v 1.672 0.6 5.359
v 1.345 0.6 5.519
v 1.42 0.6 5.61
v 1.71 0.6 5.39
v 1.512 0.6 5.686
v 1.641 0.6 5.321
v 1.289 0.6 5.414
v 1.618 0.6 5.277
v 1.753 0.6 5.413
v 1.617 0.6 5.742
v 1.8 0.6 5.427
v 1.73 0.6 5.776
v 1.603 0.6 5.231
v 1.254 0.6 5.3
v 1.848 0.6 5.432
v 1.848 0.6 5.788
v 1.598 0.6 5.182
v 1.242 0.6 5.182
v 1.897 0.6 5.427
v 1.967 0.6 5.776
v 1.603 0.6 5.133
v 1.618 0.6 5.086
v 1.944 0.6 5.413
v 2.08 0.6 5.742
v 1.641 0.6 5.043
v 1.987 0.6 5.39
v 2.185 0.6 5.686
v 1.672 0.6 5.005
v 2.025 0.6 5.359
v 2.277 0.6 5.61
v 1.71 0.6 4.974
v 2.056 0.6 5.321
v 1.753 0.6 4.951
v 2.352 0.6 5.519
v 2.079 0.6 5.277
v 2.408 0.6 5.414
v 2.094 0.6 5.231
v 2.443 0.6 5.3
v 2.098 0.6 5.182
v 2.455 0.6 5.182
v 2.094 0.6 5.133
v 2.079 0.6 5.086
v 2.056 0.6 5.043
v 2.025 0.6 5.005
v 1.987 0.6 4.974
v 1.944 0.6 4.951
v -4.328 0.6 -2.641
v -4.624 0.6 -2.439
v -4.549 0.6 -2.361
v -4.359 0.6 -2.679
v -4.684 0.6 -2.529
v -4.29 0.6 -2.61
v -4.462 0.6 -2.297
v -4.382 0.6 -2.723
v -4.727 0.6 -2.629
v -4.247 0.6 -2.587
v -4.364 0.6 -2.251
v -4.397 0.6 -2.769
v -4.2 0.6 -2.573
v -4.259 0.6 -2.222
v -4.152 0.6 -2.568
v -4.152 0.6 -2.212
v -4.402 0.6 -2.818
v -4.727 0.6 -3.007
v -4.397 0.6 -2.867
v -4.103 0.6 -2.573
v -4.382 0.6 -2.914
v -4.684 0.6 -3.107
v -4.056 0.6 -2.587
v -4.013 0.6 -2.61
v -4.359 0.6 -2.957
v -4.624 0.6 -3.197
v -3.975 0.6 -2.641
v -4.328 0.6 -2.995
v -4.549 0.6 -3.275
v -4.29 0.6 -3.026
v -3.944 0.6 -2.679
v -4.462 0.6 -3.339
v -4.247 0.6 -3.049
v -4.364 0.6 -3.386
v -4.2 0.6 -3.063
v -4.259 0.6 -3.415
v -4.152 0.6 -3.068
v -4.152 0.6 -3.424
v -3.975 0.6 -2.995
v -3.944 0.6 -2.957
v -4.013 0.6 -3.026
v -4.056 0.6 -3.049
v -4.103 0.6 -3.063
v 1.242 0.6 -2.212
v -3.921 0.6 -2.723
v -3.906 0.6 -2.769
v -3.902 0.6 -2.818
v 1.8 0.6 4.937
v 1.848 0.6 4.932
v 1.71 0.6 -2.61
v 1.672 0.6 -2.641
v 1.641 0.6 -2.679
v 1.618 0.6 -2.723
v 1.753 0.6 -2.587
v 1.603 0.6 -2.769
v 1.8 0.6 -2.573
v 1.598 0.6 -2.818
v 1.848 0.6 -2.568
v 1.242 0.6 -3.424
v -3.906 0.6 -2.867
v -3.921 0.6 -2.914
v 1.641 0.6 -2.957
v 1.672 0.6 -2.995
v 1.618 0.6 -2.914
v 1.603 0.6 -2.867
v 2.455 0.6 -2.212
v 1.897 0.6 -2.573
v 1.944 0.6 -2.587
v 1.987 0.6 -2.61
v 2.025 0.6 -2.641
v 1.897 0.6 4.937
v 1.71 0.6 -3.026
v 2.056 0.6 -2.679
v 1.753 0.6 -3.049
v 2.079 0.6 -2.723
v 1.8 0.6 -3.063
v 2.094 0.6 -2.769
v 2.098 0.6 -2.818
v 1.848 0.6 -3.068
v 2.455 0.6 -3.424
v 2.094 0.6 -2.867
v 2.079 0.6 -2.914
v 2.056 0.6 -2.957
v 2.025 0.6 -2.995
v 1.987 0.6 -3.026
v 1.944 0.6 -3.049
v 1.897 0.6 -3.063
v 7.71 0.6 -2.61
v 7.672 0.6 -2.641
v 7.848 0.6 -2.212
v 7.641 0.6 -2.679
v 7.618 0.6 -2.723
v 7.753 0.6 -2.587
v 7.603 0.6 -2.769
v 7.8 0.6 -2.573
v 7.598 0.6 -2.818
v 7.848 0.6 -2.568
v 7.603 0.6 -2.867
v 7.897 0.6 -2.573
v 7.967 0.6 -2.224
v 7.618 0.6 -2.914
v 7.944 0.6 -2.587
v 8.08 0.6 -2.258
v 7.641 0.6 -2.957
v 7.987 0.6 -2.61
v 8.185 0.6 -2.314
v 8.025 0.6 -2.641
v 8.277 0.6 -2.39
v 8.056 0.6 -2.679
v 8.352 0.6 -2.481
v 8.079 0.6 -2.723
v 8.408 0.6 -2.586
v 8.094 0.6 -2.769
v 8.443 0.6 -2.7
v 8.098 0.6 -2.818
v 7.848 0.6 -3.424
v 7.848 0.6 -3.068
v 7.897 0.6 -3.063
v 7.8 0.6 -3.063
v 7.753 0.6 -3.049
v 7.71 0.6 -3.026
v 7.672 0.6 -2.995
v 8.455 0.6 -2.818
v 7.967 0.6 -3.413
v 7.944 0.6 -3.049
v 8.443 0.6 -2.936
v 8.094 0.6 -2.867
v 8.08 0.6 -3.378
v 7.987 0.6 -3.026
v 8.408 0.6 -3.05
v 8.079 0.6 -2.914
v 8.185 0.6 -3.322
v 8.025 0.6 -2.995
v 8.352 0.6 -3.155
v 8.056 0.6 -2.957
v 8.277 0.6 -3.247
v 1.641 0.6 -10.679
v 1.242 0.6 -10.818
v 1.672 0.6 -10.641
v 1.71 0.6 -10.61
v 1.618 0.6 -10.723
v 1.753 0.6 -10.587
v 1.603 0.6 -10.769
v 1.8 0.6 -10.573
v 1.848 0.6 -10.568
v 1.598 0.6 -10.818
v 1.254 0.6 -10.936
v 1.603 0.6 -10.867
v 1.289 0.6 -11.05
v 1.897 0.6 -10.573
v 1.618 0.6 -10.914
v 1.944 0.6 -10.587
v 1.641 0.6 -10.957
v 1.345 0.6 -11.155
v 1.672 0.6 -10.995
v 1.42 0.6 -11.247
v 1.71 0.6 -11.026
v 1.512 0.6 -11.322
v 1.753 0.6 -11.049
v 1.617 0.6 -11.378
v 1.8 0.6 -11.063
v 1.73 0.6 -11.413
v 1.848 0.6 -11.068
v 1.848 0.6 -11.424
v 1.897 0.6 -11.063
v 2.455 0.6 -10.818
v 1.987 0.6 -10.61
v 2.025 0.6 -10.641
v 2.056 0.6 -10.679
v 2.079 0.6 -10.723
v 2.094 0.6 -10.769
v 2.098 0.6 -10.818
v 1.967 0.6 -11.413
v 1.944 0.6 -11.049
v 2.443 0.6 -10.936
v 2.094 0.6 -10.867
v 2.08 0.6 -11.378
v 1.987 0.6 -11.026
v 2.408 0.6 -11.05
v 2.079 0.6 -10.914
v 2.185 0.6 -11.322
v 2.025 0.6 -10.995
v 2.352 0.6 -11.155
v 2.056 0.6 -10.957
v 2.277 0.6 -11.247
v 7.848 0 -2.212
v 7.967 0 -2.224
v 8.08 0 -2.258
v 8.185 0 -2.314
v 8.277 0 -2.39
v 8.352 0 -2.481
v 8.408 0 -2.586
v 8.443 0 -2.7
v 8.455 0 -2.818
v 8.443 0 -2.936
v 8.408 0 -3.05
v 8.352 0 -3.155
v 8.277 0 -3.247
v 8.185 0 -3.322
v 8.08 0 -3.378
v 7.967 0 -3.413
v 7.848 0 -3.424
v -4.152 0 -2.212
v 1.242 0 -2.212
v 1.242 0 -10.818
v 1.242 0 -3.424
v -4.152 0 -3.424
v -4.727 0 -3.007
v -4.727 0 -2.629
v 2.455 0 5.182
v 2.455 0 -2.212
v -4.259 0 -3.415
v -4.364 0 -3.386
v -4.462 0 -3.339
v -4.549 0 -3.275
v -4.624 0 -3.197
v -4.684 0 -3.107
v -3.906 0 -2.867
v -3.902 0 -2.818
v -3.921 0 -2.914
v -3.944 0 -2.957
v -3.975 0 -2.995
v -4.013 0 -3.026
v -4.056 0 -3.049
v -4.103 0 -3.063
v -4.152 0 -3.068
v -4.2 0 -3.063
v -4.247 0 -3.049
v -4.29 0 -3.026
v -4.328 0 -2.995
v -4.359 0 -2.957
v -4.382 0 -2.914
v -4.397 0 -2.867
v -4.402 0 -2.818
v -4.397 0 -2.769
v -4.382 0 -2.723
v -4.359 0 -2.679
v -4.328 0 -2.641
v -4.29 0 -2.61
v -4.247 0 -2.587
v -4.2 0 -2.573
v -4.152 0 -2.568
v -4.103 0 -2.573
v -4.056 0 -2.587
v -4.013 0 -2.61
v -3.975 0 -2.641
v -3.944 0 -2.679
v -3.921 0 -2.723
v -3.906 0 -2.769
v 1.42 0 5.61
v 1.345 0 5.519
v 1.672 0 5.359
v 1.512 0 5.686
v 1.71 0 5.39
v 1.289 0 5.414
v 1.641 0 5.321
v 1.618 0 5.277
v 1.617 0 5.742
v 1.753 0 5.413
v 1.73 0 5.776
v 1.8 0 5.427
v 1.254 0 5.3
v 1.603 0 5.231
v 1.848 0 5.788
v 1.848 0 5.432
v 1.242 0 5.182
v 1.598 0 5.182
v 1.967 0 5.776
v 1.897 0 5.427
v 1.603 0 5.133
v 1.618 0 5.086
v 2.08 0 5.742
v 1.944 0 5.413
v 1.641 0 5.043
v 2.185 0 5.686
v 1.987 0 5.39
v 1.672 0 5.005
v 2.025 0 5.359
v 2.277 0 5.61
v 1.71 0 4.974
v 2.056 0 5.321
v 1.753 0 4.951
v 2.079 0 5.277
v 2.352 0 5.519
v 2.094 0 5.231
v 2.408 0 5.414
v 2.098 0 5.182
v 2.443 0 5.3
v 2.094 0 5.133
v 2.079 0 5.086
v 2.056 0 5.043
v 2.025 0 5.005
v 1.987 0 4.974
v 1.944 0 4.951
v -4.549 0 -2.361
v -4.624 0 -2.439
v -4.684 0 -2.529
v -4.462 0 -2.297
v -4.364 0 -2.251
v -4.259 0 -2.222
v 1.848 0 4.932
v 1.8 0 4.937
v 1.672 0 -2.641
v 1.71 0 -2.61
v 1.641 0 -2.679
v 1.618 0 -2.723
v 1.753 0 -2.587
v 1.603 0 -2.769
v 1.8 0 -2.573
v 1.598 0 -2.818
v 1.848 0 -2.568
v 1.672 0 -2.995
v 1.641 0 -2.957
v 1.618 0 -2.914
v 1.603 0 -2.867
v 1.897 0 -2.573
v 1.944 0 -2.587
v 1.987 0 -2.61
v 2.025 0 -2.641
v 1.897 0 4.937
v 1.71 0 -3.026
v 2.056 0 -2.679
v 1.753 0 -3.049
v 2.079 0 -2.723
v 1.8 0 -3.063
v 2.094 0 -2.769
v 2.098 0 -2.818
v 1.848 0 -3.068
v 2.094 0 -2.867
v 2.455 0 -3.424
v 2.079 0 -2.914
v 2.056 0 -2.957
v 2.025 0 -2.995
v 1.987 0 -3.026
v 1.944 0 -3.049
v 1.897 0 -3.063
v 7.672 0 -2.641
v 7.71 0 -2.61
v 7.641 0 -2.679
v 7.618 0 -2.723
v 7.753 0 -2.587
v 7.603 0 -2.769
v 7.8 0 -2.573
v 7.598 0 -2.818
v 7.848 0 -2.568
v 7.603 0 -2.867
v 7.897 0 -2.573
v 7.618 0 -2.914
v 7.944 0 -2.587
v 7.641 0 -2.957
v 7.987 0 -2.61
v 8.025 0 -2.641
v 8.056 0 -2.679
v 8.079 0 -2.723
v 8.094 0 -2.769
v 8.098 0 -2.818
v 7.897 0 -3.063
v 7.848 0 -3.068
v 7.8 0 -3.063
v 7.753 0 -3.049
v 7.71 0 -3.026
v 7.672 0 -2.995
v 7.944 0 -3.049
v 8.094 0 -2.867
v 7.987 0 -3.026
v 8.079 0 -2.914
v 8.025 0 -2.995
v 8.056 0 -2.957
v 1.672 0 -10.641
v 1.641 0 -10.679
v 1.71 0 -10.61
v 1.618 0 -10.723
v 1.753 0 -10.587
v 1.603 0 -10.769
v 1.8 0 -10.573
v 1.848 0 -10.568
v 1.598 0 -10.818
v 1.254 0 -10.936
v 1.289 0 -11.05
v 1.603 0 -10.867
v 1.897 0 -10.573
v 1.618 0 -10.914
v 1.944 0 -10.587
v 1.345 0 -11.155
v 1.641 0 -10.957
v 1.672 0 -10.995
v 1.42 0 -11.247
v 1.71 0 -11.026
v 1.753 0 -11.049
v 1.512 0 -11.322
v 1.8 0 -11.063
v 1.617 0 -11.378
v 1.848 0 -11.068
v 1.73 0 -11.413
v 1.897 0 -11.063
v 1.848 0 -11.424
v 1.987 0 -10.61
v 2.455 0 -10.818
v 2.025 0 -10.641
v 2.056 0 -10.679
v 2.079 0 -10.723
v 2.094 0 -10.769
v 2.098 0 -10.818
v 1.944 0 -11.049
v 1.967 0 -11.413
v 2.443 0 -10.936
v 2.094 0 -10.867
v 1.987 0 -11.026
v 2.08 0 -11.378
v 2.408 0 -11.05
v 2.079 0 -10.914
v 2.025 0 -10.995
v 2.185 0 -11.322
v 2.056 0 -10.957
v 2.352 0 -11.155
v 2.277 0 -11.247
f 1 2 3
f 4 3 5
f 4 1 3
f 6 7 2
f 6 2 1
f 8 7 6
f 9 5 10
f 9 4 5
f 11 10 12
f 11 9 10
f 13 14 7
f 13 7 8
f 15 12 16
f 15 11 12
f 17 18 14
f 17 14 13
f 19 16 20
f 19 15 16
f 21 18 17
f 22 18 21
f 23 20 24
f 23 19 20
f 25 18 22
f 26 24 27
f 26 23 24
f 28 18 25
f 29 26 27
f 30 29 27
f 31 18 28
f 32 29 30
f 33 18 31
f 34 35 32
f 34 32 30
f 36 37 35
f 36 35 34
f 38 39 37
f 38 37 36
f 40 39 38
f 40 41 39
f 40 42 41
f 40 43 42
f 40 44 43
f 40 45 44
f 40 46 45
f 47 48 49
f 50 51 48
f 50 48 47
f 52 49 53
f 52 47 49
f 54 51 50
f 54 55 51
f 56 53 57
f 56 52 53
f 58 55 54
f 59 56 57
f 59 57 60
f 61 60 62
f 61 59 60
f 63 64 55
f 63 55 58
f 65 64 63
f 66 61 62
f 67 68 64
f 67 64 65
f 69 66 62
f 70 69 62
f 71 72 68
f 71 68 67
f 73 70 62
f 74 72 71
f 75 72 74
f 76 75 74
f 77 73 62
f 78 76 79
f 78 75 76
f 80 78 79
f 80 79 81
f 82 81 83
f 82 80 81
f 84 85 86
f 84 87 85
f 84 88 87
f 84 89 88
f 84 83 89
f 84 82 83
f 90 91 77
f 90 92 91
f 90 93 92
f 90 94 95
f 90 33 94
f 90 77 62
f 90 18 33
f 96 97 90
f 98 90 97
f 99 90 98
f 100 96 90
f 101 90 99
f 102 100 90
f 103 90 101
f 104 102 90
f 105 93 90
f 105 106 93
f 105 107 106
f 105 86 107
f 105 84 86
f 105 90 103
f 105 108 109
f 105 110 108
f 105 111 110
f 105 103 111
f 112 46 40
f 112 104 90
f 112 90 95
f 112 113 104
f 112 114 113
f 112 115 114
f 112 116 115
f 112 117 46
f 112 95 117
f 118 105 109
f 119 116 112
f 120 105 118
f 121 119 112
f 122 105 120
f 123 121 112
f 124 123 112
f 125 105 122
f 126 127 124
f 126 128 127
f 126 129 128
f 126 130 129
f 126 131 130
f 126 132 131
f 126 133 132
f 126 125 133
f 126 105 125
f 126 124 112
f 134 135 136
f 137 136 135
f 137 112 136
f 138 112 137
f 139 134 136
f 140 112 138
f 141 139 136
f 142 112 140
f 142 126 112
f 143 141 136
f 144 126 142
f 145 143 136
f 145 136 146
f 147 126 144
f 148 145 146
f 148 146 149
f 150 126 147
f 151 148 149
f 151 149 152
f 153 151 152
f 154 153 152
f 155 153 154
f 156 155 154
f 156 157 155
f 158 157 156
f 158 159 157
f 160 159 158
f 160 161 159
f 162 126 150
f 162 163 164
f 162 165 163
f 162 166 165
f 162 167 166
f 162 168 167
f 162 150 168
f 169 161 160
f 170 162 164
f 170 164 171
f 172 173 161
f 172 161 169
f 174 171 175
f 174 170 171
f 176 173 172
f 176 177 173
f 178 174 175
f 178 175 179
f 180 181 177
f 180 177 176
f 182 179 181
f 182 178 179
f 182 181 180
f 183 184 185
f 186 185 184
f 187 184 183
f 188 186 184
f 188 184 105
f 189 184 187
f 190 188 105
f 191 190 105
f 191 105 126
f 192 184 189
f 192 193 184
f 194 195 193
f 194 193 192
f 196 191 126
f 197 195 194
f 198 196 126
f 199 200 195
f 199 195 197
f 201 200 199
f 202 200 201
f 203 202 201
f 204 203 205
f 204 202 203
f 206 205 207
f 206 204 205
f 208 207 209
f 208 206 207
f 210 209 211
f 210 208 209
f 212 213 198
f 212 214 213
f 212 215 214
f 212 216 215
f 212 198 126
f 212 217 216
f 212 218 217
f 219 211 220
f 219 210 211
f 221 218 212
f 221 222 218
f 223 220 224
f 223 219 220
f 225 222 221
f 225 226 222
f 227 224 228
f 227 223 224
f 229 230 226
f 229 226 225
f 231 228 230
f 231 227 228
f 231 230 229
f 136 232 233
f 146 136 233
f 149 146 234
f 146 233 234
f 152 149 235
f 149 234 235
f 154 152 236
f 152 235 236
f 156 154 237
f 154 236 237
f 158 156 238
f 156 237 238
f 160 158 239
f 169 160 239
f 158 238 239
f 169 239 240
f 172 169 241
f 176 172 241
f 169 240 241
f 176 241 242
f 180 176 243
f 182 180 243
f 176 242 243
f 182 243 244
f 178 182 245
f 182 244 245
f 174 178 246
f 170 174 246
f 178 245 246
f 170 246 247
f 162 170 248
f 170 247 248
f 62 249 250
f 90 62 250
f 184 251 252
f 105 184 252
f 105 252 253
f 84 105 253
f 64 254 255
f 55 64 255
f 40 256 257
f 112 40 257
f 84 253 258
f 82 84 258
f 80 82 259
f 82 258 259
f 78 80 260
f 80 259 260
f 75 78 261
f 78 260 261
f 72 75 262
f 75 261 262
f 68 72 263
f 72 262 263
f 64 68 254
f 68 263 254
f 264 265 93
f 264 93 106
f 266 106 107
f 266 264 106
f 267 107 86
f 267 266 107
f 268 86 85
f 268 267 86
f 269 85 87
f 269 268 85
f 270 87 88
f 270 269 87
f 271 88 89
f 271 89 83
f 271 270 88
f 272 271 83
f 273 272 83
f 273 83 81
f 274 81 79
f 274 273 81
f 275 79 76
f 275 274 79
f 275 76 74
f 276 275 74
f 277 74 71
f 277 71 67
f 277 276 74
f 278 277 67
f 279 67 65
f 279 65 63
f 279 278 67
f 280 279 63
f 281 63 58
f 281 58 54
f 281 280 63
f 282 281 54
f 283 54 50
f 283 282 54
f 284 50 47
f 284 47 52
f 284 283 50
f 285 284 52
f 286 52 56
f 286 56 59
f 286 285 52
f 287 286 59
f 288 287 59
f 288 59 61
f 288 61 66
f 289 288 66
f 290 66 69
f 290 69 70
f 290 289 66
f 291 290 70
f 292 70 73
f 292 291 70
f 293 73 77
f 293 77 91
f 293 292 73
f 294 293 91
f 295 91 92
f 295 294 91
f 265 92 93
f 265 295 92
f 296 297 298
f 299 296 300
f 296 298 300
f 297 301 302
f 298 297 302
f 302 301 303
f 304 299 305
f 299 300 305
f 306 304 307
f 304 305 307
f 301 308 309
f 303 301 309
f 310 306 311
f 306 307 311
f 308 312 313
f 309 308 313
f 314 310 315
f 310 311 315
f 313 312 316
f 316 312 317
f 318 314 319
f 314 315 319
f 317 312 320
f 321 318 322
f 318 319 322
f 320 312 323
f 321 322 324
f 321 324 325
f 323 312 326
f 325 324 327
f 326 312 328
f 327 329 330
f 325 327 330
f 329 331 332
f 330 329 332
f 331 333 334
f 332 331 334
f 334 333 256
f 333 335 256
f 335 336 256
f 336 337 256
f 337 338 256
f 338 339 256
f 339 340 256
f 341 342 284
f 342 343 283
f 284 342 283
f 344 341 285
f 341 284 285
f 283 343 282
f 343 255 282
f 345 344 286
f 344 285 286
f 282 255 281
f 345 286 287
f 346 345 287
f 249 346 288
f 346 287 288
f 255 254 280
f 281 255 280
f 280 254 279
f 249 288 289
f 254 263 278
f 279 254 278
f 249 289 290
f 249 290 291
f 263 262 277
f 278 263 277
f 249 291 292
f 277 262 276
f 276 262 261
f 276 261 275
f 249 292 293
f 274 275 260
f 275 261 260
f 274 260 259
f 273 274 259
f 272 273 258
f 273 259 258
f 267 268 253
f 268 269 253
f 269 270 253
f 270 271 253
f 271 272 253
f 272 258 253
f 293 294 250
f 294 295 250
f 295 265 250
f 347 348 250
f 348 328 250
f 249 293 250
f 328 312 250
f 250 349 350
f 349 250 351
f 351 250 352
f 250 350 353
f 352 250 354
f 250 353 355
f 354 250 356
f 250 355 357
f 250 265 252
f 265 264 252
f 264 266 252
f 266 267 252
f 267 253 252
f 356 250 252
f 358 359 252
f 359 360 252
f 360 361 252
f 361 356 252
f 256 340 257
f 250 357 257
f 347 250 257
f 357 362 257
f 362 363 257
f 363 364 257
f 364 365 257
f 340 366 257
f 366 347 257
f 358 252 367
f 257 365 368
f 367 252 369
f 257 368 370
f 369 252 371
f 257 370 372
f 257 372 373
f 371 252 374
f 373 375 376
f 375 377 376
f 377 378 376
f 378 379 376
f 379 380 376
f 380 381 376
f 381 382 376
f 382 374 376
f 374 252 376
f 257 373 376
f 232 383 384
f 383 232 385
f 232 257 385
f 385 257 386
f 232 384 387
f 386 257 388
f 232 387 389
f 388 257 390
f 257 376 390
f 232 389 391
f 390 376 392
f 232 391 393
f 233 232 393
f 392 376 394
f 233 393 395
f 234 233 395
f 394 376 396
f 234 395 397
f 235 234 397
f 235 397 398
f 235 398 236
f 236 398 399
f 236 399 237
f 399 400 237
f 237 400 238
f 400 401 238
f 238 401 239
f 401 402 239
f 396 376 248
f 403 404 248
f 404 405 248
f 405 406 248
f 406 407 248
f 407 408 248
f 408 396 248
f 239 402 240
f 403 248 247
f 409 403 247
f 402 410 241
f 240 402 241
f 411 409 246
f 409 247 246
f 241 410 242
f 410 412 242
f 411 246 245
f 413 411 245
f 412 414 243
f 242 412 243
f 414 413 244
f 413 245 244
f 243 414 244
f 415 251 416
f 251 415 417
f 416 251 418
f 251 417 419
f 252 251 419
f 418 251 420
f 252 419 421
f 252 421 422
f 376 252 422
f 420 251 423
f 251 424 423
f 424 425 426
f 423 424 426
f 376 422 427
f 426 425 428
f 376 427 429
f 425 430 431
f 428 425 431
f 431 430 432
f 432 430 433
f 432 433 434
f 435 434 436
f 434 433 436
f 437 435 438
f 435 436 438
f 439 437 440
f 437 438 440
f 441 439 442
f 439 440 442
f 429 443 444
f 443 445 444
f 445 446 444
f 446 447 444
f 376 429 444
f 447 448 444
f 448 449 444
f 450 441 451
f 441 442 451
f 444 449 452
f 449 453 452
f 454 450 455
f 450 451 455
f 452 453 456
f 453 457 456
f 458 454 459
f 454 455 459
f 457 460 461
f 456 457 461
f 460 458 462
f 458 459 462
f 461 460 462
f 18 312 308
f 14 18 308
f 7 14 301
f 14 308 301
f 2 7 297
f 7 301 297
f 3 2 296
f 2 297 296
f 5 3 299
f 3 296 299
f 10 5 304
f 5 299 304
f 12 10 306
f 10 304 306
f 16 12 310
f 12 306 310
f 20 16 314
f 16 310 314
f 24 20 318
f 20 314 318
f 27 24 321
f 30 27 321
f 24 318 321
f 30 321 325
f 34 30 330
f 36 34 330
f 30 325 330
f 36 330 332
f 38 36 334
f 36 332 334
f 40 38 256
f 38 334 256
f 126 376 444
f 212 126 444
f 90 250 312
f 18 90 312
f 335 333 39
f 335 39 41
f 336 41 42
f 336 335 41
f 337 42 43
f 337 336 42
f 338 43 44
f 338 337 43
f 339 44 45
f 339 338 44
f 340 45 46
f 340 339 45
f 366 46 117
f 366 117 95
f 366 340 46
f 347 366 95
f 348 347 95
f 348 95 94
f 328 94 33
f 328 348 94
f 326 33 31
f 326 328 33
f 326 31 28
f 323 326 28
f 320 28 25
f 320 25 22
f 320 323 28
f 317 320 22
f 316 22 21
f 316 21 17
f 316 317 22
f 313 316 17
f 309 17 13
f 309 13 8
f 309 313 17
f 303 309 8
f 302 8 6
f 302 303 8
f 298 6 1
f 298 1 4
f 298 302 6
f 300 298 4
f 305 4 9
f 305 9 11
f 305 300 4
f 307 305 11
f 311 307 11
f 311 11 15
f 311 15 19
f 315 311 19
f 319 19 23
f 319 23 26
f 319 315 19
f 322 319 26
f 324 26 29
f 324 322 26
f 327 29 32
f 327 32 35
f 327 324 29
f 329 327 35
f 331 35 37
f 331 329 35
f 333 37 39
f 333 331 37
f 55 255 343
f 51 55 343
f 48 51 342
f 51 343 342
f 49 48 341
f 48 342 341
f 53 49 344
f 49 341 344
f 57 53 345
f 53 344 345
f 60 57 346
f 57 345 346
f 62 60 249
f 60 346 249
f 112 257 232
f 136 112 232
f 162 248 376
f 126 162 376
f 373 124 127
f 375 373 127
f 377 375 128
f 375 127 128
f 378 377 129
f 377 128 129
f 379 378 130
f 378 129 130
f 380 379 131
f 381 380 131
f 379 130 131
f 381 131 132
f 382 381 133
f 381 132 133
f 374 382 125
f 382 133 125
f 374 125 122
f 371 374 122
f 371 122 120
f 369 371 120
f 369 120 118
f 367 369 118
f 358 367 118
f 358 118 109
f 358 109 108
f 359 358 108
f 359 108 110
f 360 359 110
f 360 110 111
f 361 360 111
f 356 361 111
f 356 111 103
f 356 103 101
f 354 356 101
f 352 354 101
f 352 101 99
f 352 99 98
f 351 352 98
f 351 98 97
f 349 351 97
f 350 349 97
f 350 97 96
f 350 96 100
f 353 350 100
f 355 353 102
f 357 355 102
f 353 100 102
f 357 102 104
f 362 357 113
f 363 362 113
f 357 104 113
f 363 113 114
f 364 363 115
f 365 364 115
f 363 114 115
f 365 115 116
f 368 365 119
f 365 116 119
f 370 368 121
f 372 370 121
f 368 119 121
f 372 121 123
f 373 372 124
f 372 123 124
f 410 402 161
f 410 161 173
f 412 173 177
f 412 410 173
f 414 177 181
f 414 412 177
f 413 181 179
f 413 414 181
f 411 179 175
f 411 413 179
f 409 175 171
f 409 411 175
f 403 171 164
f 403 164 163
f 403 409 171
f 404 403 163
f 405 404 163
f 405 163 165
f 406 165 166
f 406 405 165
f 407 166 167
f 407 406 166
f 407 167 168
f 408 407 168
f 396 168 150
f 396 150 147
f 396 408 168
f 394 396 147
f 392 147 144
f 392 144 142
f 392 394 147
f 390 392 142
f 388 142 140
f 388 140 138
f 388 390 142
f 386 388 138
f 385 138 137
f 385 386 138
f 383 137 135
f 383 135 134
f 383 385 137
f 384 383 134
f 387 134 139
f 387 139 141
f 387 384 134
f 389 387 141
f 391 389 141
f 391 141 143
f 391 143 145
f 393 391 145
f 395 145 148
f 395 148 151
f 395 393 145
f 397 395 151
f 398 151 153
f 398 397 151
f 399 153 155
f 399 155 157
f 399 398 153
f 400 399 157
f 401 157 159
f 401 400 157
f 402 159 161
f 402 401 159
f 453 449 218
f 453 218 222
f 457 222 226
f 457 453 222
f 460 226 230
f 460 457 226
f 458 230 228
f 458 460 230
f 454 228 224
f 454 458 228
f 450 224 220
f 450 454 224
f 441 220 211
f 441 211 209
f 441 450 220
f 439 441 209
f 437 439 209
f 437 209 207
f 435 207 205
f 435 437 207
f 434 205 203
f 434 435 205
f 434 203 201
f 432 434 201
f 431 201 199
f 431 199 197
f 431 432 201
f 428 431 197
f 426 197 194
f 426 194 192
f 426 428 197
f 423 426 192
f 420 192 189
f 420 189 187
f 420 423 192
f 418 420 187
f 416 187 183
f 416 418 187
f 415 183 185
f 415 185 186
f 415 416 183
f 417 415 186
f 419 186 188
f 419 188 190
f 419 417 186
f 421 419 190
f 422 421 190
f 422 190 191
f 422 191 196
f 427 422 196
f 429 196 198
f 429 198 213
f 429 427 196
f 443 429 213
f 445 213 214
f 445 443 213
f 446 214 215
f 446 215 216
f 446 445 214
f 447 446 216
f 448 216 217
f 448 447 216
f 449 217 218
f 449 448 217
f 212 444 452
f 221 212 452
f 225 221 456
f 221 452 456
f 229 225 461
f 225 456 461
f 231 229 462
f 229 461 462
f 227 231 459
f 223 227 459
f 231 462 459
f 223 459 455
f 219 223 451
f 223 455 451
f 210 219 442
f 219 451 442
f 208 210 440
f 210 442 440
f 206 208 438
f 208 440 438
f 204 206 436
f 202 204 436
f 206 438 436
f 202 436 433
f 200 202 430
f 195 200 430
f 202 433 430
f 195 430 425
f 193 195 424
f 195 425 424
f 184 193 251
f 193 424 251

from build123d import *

# Parameters (mm, degrees)
SKETCH1_R           = 0.25
BOSS_EXTRUDE1_DEPTH = 0.6
SKETCH2_R           = 0.25
CUT_EXTRUDE1_DEPTH  = 1.6


with BuildPart() as part:
    # Sketch1 → Boss-Extrude1 (new body)
    with BuildSketch(Plane(origin=(0, 0, 0), x_dir=(1, 0, 0), z_dir=(0, 1, 0))):
        with BuildLine():
            Line((2.454545455, 3.424242424), (2.454545455, 10.818181818))
            ThreePointArc((2.454545455, 10.818181818), (1.848484848, 11.424242424), (1.242424242, 10.818181818))
            Line((1.242424242, 10.818181818), (1.242424242, 3.424242424))
            Line((1.242424242, 3.424242424), (-4.151515152, 3.424242424))
            ThreePointArc((-4.151515152, 3.424242424), (-4.506914305, 3.309100243), (-4.727272727, 3.007424182))
            Line((-4.727272727, 3.007424182), (-4.727272727, 2.628939455))
            ThreePointArc((-4.727272727, 2.628939455), (-4.506914305, 2.327263393), (-4.151515152, 2.212121212))
            Line((-4.151515152, 2.212121212), (1.242424242, 2.212121212))
            Line((1.242424242, 2.212121212), (1.242424242, -5.181818182))
            ThreePointArc((1.242424242, -5.181818182), (1.848484848, -5.787878788), (2.454545455, -5.181818182))
            Line((2.454545455, -5.181818182), (2.454545455, 2.212121212))
            Line((2.454545455, 2.212121212), (7.848484848, 2.212121212))
            ThreePointArc((7.848484848, 2.212121212), (8.454545455, 2.818181818), (7.848484848, 3.424242424))
            Line((7.848484848, 3.424242424), (2.454545455, 3.424242424))
        make_face()
        with Locations((1.848484848, 10.818181818)):
            Circle(SKETCH1_R, mode=Mode.SUBTRACT)
        with Locations((1.848484848, -5.181818182)):
            Circle(SKETCH1_R, mode=Mode.SUBTRACT)
        with Locations((-4.151515152, 2.818181818)):
            Circle(SKETCH1_R, mode=Mode.SUBTRACT)
        with Locations((7.848484848, 2.818181818)):
            Circle(SKETCH1_R, mode=Mode.SUBTRACT)
    extrude(amount=BOSS_EXTRUDE1_DEPTH)

    # Sketch2 → Cut-Extrude1 (cut, through all)
    with BuildSketch(Plane(origin=(0, 0.6, 0), x_dir=(1, 0, 0), z_dir=(0, 1, 0))):
        with Locations((1.848484848, 2.818181818)):
            Circle(SKETCH2_R)
    extrude(amount=-CUT_EXTRUDE1_DEPTH, mode=Mode.SUBTRACT)


solid = part.part
